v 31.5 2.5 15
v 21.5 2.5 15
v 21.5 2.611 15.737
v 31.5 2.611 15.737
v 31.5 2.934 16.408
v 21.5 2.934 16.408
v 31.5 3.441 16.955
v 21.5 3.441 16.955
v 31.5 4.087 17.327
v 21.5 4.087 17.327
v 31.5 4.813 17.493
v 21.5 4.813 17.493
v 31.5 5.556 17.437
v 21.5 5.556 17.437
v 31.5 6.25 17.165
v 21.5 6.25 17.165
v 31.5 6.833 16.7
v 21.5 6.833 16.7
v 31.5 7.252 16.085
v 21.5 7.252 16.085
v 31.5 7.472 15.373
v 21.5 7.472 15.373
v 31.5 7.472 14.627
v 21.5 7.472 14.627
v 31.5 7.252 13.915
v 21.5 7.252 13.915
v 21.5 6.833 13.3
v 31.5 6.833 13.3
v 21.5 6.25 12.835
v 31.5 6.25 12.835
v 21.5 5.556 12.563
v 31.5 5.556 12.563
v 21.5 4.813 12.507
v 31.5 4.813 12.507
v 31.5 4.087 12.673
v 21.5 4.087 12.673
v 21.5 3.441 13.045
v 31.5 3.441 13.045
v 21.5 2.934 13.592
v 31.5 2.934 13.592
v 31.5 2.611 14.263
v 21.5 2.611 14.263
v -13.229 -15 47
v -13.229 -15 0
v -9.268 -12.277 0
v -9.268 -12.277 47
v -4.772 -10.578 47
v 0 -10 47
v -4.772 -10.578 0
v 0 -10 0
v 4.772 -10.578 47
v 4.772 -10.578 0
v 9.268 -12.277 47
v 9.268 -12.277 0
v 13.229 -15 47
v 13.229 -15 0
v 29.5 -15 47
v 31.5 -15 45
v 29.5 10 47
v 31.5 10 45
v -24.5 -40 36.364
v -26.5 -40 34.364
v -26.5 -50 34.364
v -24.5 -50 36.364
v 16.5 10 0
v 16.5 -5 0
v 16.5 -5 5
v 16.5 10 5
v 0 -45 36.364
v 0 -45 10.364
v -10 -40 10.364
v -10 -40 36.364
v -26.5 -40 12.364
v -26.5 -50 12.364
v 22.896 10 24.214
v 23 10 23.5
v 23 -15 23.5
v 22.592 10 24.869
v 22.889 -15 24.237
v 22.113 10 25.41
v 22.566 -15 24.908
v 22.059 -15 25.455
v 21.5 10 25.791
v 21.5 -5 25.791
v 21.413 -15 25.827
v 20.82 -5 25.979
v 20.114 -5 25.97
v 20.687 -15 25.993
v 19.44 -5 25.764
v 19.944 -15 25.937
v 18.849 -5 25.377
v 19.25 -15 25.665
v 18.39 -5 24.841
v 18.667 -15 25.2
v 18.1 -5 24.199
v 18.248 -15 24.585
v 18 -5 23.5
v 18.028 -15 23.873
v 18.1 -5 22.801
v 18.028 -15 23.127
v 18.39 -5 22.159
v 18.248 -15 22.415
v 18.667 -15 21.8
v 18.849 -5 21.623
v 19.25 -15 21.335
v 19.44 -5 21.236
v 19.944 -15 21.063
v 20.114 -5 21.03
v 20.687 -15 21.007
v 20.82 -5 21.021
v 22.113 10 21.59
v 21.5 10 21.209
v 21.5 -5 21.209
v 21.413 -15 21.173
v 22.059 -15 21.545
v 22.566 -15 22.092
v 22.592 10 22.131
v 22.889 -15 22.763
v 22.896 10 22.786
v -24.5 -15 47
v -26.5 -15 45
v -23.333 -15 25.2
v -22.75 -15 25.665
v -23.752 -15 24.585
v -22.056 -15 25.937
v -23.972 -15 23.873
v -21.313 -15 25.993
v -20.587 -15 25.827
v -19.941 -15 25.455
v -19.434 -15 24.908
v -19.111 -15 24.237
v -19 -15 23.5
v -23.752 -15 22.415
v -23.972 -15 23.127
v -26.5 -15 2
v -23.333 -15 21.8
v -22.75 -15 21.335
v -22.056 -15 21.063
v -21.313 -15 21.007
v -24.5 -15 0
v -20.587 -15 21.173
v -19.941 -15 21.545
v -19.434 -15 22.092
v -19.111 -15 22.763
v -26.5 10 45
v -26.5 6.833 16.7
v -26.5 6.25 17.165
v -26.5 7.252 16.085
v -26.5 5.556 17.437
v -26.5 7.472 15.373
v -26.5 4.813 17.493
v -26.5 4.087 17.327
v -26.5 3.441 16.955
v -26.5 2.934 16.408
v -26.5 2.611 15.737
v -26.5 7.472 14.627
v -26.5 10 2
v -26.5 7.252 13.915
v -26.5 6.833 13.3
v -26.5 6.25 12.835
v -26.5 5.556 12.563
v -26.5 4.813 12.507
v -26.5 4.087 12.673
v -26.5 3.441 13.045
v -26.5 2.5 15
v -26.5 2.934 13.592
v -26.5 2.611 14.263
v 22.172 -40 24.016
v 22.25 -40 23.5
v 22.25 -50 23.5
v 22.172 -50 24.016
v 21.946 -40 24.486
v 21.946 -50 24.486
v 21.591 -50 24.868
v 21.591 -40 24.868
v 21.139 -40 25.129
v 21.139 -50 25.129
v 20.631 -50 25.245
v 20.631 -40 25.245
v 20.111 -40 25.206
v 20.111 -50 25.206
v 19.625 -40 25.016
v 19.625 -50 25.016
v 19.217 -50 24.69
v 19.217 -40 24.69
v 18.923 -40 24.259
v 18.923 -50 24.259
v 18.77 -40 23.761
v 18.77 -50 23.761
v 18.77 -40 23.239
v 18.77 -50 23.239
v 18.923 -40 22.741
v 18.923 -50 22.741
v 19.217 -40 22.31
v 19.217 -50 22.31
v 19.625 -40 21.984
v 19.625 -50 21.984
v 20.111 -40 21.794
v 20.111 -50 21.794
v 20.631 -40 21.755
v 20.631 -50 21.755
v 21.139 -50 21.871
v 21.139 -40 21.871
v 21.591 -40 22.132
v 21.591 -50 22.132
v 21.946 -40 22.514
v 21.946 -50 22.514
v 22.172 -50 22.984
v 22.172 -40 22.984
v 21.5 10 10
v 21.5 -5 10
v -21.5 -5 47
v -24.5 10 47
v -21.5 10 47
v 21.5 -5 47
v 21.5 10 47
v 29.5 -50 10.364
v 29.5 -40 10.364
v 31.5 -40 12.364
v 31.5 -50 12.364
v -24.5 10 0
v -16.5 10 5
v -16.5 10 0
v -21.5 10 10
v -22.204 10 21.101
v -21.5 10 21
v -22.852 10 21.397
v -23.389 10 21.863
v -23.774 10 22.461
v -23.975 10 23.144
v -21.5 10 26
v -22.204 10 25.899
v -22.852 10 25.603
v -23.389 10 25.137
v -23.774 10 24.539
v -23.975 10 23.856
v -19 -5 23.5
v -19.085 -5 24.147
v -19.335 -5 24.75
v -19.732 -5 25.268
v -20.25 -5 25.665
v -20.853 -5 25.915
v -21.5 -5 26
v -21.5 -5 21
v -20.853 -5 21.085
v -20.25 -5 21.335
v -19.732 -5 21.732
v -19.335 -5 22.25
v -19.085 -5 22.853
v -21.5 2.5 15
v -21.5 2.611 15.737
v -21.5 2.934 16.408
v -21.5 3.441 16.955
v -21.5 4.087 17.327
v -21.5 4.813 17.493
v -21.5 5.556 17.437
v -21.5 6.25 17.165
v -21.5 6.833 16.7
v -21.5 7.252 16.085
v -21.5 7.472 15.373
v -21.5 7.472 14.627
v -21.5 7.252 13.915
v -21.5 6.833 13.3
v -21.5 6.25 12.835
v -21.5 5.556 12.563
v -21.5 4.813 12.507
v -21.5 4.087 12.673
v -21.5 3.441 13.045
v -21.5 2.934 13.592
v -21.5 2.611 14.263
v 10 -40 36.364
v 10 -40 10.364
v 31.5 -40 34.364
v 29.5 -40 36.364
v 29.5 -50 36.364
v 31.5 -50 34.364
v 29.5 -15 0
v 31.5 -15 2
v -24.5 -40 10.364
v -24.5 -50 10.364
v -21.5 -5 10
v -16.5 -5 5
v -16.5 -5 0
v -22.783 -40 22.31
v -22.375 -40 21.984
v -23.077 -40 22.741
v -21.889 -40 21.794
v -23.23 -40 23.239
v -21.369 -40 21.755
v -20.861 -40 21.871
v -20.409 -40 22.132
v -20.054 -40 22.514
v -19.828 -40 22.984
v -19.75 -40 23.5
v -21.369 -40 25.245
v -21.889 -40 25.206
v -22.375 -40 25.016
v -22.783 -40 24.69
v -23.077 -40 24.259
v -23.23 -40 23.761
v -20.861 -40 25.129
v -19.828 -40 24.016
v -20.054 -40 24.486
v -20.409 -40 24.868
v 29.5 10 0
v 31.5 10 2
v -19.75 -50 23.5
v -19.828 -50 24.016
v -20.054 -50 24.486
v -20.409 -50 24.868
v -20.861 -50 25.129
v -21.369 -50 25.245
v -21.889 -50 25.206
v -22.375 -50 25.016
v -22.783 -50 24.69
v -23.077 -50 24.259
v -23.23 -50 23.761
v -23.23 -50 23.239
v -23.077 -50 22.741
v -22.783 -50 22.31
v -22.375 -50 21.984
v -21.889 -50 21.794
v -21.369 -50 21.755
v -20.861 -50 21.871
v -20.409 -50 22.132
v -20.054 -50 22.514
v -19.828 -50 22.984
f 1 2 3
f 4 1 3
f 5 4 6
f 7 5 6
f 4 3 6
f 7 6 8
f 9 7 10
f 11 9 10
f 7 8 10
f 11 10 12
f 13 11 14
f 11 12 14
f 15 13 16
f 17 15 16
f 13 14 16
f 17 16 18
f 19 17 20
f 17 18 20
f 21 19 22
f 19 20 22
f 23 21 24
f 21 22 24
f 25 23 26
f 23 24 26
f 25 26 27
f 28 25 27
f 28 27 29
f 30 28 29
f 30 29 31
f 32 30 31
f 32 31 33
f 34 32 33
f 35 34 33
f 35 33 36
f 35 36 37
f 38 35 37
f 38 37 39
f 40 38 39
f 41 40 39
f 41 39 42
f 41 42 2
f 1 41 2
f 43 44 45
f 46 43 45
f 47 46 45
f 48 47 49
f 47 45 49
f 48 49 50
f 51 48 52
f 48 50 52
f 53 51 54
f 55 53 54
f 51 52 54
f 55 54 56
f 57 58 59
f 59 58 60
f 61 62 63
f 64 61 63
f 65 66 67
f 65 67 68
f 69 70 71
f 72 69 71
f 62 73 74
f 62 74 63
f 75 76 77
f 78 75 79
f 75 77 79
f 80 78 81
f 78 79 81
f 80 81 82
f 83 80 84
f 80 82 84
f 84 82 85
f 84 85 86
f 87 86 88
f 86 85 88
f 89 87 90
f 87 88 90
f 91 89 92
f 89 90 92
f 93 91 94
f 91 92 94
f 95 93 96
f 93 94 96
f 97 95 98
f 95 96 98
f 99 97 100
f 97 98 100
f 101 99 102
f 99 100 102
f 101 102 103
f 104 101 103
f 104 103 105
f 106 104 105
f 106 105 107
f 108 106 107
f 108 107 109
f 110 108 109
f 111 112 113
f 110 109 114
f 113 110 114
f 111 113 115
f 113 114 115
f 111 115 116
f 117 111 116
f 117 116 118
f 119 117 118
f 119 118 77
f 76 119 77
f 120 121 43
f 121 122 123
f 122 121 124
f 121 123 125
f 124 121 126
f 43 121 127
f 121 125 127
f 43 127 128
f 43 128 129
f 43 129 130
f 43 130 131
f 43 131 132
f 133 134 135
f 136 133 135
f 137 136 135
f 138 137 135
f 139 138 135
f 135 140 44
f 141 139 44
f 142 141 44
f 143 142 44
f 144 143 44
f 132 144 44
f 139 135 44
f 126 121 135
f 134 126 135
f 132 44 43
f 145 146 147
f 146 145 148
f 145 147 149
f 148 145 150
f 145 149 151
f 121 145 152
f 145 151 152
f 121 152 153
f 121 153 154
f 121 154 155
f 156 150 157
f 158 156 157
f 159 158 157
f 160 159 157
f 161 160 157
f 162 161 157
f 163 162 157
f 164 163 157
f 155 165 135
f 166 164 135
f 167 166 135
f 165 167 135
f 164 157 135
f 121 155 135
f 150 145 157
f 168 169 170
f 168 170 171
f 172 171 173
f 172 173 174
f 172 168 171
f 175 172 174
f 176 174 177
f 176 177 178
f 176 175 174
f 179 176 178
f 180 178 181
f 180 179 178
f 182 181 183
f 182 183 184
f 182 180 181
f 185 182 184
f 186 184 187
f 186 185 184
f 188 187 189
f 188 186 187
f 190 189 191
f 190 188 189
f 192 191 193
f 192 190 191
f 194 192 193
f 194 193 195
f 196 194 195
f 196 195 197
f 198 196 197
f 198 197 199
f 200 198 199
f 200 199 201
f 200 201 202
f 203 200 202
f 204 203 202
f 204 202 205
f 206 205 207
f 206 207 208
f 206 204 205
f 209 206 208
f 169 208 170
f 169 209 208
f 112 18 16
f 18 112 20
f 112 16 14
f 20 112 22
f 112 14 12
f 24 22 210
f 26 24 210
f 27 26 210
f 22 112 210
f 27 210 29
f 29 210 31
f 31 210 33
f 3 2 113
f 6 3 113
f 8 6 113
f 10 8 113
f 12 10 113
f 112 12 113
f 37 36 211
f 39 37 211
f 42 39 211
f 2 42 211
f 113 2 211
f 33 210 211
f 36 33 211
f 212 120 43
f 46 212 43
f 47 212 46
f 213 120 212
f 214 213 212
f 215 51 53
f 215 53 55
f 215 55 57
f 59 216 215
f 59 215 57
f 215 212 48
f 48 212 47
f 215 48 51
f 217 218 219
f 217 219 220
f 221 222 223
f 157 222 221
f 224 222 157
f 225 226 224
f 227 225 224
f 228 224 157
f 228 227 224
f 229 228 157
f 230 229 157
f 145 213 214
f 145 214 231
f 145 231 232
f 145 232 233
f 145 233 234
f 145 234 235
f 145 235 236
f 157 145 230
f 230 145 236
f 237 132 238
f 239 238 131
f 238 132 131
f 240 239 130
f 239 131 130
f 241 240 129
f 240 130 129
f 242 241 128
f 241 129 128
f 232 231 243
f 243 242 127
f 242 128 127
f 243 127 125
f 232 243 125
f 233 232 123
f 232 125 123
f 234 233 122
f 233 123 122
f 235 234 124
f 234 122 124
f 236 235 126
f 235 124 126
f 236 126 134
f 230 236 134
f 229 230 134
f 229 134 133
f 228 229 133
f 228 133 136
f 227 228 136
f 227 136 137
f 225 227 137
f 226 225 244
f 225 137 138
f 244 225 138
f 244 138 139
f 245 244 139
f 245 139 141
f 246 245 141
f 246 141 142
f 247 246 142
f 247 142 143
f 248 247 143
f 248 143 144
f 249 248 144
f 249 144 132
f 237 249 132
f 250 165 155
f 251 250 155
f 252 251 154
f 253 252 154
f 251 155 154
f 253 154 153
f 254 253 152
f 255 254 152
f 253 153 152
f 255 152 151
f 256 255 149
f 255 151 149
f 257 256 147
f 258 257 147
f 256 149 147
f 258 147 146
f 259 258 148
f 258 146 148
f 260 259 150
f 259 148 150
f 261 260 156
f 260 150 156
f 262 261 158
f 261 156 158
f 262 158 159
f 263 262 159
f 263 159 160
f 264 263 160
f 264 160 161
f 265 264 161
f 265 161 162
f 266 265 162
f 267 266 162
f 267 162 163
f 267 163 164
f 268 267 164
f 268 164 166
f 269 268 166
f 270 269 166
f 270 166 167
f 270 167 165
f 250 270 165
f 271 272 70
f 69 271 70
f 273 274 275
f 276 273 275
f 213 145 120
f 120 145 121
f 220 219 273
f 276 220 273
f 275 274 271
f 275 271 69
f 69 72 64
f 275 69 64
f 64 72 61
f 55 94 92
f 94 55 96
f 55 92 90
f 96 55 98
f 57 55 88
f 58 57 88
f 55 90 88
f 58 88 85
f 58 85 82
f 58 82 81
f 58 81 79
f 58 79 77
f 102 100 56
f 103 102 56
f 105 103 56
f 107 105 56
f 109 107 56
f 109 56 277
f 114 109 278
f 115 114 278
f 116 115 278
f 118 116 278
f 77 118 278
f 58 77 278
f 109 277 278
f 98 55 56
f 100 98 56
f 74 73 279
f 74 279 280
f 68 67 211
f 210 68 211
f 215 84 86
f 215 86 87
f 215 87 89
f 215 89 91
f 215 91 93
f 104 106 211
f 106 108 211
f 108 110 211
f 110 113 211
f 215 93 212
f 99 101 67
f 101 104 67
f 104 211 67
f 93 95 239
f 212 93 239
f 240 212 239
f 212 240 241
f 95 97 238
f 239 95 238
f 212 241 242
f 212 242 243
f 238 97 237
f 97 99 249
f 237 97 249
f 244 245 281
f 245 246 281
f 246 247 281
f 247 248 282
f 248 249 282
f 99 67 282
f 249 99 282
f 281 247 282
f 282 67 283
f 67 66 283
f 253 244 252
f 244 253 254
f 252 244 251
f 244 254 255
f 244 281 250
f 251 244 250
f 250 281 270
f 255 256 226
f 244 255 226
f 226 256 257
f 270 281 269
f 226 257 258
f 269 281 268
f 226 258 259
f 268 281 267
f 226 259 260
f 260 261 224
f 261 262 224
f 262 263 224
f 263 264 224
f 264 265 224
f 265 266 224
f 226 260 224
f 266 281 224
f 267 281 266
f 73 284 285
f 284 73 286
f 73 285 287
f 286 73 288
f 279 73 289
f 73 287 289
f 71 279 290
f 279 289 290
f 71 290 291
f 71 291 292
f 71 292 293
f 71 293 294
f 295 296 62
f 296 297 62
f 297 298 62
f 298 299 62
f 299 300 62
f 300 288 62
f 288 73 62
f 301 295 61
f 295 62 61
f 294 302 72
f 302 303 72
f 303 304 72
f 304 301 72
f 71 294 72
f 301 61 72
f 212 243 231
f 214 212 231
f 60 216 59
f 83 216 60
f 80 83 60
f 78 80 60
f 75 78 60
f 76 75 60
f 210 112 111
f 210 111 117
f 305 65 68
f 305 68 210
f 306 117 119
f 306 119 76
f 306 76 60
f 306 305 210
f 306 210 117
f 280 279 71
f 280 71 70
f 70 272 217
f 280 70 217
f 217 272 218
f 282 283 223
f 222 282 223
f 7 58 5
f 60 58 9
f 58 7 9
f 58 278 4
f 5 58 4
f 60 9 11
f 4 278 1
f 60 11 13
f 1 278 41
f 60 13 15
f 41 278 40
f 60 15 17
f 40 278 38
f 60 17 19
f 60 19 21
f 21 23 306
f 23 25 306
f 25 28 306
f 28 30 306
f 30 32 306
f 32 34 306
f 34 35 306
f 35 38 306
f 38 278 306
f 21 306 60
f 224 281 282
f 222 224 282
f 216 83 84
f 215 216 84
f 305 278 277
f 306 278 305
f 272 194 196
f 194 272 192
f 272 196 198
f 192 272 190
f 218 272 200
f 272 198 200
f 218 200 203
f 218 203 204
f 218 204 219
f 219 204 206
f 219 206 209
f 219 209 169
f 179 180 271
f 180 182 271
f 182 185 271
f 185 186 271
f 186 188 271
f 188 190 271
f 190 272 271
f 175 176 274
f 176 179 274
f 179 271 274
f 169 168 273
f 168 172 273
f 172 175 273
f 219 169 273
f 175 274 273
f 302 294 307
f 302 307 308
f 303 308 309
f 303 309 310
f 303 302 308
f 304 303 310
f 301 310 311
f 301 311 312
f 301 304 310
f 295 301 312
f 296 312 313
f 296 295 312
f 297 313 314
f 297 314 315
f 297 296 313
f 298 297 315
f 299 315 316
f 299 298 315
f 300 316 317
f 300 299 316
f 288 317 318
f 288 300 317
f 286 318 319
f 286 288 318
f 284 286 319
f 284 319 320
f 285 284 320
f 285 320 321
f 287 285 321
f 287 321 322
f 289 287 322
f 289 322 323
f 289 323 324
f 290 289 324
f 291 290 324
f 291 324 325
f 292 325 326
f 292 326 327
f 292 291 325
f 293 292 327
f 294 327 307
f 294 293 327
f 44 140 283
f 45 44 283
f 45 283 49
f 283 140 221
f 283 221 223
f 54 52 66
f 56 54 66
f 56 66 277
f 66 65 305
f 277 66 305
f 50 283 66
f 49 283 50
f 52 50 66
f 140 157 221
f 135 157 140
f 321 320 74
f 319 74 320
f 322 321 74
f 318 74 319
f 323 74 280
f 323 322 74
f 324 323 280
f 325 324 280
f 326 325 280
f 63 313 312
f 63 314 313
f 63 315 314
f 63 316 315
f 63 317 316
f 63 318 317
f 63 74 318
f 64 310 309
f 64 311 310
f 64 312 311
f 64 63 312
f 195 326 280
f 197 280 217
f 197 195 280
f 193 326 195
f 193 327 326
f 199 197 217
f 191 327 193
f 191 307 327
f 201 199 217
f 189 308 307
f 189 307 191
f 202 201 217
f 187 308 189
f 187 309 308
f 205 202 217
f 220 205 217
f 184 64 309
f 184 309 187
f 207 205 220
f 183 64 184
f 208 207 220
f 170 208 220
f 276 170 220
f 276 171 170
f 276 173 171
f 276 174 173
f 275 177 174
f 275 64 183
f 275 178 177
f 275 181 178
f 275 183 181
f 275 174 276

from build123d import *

# Parameters (mm, degrees)
F1_DEPTH  = 47
F0_W      = 5
F0_H      = 15
F2_DEPTH  = 5
F3_R      = 2.5
F4_DEPTH  = 60
F5_R      = 2.5
F6_DEPTH  = 60
F8_DEPTH  = 15
F9_SIZE   = 2
F11_W     = 18.2712434447
F11_H     = 26
F11_R     = 2.5
F11_W_2   = 26.4575131106
F11_W_3   = 13.2712434447
F11_R_2   = 1.75
F12_DEPTH = 10
F13_SIZE  = 2
F15_DEPTH = 40


with BuildPart() as f1:
    # F0 (on Top) → F1 (new body)
    with BuildSketch(Plane.XY):
        with BuildLine():
            Line((-21.5, 10), (-26.5, 10))
            Line((-26.5, 10), (-26.5, -10))
            Line((-26.5, -10), (-26.5, -15))
            Line((-26.5, -15), (-13.2287565553, -15))
            ThreePointArc((-13.2287565553, -15), (0, -10), (13.2287565553, -15))
            Line((13.2287565553, -15), (31.5, -15))
            Line((31.5, -15), (31.5, -10))
            Line((31.5, -10), (31.5, 10))
            Line((31.5, 10), (21.5, 10))
            Line((21.5, 10), (21.5, -5))
            Line((21.5, -5), (16.5, -5))
            Line((16.5, -5), (-16.5, -5))
            Line((-16.5, -5), (-21.5, -5))
            Line((-21.5, -5), (-21.5, 10))
        make_face()
    extrude(amount=F1_DEPTH)

    # F0 (on Top) → F2 (join)
    with BuildSketch(Plane.XY):
        with Locations((-19, 2.5)):
            Rectangle(F0_W, F0_H)
        with Locations((19, 2.5)):
            Rectangle(F0_W, F0_H)
    extrude(amount=F2_DEPTH)

    # F3 (on face) → F4 (cut)
    with BuildSketch(Plane(origin=(-26.5, 0, 0), x_dir=(0, -1, 0), z_dir=(-1, 0, 0))):
        with Locations((-5, 15)):
            Circle(F3_R)
    extrude(amount=-F4_DEPTH, mode=Mode.SUBTRACT)

    # F5 (on face) → F6 (cut)
    with BuildSketch(Plane.XZ.offset(15)):
        with Locations((20.5, 23.5)):
            Circle(F5_R)
        with Locations((-21.5, 23.5)):
            Circle(F5_R)
    extrude(amount=-F6_DEPTH, mode=Mode.SUBTRACT)

    # F7 (on face) → F8 (join)
    with BuildSketch(Plane(origin=(0, -5, 0), x_dir=(-1, 0, 0), z_dir=(0, 1, 0))):
        Polygon((16.5, 5), (21.5, 5), (21.5, 10), align=None)
        Polygon((-21.5, 5), (-16.5, 5), (-21.5, 10), align=None)
    extrude(amount=F8_DEPTH)

    # F9
    f9_edges = [f1.edges().sort_by_distance(p)[0] for p in [
        (31.5, -2.5, 0),
        (-26.5, -2.5, 0),
        (-26.5, -2.5, 47),
        (31.5, -2.5, 47),
    ]]
    chamfer(f9_edges, length=F9_SIZE)


with BuildPart() as f12:
    # F11 (on offset) → F12 (new body)
    with BuildSketch(Plane.XZ.offset(40)):
        with Locations((22.3643782777, 23.3637194261)):
            Rectangle(F11_W, F11_H)
        with Locations((20.5, 23.5)):
            Circle(F11_R, mode=Mode.SUBTRACT)
        with Locations((0, 23.3637194261)):
            Rectangle(F11_W_2, F11_H)
        with Locations((-19.8643782777, 23.3637194261)):
            Rectangle(F11_W_3, F11_H)
        with Locations((-21.5, 23.5)):
            Circle(F11_R, mode=Mode.SUBTRACT)
        with Locations((20.5, 23.5)):
            Circle(F11_R)
        with Locations((20.5, 23.5)):
            Circle(F11_R_2, mode=Mode.SUBTRACT)
        with Locations((-21.5, 23.5)):
            Circle(F11_R)
        with Locations((-21.5, 23.5)):
            Circle(F11_R_2, mode=Mode.SUBTRACT)
    extrude(amount=F12_DEPTH)

    # F13
    f13_edges = [f12.edges().sort_by_distance(p)[0] for p in [
        (-26.5, -45, 10.363719),
        (-26.5, -45, 36.363719),
        (31.5, -45, 36.363719),
        (31.5, -45, 10.363719),
    ]]
    chamfer(f13_edges, length=F13_SIZE)

    # F14 (on face) → F15 (cut)
    with BuildSketch(Plane(origin=(0, 0, 10.3637194261), x_dir=(1, 0, 0), z_dir=(0, 0, -1))):
        Polygon((10, 40), (0, 45), (-10, 40), align=None)
    extrude(amount=-F15_DEPTH, mode=Mode.SUBTRACT)


solid = Compound([f1.part, f12.part])
